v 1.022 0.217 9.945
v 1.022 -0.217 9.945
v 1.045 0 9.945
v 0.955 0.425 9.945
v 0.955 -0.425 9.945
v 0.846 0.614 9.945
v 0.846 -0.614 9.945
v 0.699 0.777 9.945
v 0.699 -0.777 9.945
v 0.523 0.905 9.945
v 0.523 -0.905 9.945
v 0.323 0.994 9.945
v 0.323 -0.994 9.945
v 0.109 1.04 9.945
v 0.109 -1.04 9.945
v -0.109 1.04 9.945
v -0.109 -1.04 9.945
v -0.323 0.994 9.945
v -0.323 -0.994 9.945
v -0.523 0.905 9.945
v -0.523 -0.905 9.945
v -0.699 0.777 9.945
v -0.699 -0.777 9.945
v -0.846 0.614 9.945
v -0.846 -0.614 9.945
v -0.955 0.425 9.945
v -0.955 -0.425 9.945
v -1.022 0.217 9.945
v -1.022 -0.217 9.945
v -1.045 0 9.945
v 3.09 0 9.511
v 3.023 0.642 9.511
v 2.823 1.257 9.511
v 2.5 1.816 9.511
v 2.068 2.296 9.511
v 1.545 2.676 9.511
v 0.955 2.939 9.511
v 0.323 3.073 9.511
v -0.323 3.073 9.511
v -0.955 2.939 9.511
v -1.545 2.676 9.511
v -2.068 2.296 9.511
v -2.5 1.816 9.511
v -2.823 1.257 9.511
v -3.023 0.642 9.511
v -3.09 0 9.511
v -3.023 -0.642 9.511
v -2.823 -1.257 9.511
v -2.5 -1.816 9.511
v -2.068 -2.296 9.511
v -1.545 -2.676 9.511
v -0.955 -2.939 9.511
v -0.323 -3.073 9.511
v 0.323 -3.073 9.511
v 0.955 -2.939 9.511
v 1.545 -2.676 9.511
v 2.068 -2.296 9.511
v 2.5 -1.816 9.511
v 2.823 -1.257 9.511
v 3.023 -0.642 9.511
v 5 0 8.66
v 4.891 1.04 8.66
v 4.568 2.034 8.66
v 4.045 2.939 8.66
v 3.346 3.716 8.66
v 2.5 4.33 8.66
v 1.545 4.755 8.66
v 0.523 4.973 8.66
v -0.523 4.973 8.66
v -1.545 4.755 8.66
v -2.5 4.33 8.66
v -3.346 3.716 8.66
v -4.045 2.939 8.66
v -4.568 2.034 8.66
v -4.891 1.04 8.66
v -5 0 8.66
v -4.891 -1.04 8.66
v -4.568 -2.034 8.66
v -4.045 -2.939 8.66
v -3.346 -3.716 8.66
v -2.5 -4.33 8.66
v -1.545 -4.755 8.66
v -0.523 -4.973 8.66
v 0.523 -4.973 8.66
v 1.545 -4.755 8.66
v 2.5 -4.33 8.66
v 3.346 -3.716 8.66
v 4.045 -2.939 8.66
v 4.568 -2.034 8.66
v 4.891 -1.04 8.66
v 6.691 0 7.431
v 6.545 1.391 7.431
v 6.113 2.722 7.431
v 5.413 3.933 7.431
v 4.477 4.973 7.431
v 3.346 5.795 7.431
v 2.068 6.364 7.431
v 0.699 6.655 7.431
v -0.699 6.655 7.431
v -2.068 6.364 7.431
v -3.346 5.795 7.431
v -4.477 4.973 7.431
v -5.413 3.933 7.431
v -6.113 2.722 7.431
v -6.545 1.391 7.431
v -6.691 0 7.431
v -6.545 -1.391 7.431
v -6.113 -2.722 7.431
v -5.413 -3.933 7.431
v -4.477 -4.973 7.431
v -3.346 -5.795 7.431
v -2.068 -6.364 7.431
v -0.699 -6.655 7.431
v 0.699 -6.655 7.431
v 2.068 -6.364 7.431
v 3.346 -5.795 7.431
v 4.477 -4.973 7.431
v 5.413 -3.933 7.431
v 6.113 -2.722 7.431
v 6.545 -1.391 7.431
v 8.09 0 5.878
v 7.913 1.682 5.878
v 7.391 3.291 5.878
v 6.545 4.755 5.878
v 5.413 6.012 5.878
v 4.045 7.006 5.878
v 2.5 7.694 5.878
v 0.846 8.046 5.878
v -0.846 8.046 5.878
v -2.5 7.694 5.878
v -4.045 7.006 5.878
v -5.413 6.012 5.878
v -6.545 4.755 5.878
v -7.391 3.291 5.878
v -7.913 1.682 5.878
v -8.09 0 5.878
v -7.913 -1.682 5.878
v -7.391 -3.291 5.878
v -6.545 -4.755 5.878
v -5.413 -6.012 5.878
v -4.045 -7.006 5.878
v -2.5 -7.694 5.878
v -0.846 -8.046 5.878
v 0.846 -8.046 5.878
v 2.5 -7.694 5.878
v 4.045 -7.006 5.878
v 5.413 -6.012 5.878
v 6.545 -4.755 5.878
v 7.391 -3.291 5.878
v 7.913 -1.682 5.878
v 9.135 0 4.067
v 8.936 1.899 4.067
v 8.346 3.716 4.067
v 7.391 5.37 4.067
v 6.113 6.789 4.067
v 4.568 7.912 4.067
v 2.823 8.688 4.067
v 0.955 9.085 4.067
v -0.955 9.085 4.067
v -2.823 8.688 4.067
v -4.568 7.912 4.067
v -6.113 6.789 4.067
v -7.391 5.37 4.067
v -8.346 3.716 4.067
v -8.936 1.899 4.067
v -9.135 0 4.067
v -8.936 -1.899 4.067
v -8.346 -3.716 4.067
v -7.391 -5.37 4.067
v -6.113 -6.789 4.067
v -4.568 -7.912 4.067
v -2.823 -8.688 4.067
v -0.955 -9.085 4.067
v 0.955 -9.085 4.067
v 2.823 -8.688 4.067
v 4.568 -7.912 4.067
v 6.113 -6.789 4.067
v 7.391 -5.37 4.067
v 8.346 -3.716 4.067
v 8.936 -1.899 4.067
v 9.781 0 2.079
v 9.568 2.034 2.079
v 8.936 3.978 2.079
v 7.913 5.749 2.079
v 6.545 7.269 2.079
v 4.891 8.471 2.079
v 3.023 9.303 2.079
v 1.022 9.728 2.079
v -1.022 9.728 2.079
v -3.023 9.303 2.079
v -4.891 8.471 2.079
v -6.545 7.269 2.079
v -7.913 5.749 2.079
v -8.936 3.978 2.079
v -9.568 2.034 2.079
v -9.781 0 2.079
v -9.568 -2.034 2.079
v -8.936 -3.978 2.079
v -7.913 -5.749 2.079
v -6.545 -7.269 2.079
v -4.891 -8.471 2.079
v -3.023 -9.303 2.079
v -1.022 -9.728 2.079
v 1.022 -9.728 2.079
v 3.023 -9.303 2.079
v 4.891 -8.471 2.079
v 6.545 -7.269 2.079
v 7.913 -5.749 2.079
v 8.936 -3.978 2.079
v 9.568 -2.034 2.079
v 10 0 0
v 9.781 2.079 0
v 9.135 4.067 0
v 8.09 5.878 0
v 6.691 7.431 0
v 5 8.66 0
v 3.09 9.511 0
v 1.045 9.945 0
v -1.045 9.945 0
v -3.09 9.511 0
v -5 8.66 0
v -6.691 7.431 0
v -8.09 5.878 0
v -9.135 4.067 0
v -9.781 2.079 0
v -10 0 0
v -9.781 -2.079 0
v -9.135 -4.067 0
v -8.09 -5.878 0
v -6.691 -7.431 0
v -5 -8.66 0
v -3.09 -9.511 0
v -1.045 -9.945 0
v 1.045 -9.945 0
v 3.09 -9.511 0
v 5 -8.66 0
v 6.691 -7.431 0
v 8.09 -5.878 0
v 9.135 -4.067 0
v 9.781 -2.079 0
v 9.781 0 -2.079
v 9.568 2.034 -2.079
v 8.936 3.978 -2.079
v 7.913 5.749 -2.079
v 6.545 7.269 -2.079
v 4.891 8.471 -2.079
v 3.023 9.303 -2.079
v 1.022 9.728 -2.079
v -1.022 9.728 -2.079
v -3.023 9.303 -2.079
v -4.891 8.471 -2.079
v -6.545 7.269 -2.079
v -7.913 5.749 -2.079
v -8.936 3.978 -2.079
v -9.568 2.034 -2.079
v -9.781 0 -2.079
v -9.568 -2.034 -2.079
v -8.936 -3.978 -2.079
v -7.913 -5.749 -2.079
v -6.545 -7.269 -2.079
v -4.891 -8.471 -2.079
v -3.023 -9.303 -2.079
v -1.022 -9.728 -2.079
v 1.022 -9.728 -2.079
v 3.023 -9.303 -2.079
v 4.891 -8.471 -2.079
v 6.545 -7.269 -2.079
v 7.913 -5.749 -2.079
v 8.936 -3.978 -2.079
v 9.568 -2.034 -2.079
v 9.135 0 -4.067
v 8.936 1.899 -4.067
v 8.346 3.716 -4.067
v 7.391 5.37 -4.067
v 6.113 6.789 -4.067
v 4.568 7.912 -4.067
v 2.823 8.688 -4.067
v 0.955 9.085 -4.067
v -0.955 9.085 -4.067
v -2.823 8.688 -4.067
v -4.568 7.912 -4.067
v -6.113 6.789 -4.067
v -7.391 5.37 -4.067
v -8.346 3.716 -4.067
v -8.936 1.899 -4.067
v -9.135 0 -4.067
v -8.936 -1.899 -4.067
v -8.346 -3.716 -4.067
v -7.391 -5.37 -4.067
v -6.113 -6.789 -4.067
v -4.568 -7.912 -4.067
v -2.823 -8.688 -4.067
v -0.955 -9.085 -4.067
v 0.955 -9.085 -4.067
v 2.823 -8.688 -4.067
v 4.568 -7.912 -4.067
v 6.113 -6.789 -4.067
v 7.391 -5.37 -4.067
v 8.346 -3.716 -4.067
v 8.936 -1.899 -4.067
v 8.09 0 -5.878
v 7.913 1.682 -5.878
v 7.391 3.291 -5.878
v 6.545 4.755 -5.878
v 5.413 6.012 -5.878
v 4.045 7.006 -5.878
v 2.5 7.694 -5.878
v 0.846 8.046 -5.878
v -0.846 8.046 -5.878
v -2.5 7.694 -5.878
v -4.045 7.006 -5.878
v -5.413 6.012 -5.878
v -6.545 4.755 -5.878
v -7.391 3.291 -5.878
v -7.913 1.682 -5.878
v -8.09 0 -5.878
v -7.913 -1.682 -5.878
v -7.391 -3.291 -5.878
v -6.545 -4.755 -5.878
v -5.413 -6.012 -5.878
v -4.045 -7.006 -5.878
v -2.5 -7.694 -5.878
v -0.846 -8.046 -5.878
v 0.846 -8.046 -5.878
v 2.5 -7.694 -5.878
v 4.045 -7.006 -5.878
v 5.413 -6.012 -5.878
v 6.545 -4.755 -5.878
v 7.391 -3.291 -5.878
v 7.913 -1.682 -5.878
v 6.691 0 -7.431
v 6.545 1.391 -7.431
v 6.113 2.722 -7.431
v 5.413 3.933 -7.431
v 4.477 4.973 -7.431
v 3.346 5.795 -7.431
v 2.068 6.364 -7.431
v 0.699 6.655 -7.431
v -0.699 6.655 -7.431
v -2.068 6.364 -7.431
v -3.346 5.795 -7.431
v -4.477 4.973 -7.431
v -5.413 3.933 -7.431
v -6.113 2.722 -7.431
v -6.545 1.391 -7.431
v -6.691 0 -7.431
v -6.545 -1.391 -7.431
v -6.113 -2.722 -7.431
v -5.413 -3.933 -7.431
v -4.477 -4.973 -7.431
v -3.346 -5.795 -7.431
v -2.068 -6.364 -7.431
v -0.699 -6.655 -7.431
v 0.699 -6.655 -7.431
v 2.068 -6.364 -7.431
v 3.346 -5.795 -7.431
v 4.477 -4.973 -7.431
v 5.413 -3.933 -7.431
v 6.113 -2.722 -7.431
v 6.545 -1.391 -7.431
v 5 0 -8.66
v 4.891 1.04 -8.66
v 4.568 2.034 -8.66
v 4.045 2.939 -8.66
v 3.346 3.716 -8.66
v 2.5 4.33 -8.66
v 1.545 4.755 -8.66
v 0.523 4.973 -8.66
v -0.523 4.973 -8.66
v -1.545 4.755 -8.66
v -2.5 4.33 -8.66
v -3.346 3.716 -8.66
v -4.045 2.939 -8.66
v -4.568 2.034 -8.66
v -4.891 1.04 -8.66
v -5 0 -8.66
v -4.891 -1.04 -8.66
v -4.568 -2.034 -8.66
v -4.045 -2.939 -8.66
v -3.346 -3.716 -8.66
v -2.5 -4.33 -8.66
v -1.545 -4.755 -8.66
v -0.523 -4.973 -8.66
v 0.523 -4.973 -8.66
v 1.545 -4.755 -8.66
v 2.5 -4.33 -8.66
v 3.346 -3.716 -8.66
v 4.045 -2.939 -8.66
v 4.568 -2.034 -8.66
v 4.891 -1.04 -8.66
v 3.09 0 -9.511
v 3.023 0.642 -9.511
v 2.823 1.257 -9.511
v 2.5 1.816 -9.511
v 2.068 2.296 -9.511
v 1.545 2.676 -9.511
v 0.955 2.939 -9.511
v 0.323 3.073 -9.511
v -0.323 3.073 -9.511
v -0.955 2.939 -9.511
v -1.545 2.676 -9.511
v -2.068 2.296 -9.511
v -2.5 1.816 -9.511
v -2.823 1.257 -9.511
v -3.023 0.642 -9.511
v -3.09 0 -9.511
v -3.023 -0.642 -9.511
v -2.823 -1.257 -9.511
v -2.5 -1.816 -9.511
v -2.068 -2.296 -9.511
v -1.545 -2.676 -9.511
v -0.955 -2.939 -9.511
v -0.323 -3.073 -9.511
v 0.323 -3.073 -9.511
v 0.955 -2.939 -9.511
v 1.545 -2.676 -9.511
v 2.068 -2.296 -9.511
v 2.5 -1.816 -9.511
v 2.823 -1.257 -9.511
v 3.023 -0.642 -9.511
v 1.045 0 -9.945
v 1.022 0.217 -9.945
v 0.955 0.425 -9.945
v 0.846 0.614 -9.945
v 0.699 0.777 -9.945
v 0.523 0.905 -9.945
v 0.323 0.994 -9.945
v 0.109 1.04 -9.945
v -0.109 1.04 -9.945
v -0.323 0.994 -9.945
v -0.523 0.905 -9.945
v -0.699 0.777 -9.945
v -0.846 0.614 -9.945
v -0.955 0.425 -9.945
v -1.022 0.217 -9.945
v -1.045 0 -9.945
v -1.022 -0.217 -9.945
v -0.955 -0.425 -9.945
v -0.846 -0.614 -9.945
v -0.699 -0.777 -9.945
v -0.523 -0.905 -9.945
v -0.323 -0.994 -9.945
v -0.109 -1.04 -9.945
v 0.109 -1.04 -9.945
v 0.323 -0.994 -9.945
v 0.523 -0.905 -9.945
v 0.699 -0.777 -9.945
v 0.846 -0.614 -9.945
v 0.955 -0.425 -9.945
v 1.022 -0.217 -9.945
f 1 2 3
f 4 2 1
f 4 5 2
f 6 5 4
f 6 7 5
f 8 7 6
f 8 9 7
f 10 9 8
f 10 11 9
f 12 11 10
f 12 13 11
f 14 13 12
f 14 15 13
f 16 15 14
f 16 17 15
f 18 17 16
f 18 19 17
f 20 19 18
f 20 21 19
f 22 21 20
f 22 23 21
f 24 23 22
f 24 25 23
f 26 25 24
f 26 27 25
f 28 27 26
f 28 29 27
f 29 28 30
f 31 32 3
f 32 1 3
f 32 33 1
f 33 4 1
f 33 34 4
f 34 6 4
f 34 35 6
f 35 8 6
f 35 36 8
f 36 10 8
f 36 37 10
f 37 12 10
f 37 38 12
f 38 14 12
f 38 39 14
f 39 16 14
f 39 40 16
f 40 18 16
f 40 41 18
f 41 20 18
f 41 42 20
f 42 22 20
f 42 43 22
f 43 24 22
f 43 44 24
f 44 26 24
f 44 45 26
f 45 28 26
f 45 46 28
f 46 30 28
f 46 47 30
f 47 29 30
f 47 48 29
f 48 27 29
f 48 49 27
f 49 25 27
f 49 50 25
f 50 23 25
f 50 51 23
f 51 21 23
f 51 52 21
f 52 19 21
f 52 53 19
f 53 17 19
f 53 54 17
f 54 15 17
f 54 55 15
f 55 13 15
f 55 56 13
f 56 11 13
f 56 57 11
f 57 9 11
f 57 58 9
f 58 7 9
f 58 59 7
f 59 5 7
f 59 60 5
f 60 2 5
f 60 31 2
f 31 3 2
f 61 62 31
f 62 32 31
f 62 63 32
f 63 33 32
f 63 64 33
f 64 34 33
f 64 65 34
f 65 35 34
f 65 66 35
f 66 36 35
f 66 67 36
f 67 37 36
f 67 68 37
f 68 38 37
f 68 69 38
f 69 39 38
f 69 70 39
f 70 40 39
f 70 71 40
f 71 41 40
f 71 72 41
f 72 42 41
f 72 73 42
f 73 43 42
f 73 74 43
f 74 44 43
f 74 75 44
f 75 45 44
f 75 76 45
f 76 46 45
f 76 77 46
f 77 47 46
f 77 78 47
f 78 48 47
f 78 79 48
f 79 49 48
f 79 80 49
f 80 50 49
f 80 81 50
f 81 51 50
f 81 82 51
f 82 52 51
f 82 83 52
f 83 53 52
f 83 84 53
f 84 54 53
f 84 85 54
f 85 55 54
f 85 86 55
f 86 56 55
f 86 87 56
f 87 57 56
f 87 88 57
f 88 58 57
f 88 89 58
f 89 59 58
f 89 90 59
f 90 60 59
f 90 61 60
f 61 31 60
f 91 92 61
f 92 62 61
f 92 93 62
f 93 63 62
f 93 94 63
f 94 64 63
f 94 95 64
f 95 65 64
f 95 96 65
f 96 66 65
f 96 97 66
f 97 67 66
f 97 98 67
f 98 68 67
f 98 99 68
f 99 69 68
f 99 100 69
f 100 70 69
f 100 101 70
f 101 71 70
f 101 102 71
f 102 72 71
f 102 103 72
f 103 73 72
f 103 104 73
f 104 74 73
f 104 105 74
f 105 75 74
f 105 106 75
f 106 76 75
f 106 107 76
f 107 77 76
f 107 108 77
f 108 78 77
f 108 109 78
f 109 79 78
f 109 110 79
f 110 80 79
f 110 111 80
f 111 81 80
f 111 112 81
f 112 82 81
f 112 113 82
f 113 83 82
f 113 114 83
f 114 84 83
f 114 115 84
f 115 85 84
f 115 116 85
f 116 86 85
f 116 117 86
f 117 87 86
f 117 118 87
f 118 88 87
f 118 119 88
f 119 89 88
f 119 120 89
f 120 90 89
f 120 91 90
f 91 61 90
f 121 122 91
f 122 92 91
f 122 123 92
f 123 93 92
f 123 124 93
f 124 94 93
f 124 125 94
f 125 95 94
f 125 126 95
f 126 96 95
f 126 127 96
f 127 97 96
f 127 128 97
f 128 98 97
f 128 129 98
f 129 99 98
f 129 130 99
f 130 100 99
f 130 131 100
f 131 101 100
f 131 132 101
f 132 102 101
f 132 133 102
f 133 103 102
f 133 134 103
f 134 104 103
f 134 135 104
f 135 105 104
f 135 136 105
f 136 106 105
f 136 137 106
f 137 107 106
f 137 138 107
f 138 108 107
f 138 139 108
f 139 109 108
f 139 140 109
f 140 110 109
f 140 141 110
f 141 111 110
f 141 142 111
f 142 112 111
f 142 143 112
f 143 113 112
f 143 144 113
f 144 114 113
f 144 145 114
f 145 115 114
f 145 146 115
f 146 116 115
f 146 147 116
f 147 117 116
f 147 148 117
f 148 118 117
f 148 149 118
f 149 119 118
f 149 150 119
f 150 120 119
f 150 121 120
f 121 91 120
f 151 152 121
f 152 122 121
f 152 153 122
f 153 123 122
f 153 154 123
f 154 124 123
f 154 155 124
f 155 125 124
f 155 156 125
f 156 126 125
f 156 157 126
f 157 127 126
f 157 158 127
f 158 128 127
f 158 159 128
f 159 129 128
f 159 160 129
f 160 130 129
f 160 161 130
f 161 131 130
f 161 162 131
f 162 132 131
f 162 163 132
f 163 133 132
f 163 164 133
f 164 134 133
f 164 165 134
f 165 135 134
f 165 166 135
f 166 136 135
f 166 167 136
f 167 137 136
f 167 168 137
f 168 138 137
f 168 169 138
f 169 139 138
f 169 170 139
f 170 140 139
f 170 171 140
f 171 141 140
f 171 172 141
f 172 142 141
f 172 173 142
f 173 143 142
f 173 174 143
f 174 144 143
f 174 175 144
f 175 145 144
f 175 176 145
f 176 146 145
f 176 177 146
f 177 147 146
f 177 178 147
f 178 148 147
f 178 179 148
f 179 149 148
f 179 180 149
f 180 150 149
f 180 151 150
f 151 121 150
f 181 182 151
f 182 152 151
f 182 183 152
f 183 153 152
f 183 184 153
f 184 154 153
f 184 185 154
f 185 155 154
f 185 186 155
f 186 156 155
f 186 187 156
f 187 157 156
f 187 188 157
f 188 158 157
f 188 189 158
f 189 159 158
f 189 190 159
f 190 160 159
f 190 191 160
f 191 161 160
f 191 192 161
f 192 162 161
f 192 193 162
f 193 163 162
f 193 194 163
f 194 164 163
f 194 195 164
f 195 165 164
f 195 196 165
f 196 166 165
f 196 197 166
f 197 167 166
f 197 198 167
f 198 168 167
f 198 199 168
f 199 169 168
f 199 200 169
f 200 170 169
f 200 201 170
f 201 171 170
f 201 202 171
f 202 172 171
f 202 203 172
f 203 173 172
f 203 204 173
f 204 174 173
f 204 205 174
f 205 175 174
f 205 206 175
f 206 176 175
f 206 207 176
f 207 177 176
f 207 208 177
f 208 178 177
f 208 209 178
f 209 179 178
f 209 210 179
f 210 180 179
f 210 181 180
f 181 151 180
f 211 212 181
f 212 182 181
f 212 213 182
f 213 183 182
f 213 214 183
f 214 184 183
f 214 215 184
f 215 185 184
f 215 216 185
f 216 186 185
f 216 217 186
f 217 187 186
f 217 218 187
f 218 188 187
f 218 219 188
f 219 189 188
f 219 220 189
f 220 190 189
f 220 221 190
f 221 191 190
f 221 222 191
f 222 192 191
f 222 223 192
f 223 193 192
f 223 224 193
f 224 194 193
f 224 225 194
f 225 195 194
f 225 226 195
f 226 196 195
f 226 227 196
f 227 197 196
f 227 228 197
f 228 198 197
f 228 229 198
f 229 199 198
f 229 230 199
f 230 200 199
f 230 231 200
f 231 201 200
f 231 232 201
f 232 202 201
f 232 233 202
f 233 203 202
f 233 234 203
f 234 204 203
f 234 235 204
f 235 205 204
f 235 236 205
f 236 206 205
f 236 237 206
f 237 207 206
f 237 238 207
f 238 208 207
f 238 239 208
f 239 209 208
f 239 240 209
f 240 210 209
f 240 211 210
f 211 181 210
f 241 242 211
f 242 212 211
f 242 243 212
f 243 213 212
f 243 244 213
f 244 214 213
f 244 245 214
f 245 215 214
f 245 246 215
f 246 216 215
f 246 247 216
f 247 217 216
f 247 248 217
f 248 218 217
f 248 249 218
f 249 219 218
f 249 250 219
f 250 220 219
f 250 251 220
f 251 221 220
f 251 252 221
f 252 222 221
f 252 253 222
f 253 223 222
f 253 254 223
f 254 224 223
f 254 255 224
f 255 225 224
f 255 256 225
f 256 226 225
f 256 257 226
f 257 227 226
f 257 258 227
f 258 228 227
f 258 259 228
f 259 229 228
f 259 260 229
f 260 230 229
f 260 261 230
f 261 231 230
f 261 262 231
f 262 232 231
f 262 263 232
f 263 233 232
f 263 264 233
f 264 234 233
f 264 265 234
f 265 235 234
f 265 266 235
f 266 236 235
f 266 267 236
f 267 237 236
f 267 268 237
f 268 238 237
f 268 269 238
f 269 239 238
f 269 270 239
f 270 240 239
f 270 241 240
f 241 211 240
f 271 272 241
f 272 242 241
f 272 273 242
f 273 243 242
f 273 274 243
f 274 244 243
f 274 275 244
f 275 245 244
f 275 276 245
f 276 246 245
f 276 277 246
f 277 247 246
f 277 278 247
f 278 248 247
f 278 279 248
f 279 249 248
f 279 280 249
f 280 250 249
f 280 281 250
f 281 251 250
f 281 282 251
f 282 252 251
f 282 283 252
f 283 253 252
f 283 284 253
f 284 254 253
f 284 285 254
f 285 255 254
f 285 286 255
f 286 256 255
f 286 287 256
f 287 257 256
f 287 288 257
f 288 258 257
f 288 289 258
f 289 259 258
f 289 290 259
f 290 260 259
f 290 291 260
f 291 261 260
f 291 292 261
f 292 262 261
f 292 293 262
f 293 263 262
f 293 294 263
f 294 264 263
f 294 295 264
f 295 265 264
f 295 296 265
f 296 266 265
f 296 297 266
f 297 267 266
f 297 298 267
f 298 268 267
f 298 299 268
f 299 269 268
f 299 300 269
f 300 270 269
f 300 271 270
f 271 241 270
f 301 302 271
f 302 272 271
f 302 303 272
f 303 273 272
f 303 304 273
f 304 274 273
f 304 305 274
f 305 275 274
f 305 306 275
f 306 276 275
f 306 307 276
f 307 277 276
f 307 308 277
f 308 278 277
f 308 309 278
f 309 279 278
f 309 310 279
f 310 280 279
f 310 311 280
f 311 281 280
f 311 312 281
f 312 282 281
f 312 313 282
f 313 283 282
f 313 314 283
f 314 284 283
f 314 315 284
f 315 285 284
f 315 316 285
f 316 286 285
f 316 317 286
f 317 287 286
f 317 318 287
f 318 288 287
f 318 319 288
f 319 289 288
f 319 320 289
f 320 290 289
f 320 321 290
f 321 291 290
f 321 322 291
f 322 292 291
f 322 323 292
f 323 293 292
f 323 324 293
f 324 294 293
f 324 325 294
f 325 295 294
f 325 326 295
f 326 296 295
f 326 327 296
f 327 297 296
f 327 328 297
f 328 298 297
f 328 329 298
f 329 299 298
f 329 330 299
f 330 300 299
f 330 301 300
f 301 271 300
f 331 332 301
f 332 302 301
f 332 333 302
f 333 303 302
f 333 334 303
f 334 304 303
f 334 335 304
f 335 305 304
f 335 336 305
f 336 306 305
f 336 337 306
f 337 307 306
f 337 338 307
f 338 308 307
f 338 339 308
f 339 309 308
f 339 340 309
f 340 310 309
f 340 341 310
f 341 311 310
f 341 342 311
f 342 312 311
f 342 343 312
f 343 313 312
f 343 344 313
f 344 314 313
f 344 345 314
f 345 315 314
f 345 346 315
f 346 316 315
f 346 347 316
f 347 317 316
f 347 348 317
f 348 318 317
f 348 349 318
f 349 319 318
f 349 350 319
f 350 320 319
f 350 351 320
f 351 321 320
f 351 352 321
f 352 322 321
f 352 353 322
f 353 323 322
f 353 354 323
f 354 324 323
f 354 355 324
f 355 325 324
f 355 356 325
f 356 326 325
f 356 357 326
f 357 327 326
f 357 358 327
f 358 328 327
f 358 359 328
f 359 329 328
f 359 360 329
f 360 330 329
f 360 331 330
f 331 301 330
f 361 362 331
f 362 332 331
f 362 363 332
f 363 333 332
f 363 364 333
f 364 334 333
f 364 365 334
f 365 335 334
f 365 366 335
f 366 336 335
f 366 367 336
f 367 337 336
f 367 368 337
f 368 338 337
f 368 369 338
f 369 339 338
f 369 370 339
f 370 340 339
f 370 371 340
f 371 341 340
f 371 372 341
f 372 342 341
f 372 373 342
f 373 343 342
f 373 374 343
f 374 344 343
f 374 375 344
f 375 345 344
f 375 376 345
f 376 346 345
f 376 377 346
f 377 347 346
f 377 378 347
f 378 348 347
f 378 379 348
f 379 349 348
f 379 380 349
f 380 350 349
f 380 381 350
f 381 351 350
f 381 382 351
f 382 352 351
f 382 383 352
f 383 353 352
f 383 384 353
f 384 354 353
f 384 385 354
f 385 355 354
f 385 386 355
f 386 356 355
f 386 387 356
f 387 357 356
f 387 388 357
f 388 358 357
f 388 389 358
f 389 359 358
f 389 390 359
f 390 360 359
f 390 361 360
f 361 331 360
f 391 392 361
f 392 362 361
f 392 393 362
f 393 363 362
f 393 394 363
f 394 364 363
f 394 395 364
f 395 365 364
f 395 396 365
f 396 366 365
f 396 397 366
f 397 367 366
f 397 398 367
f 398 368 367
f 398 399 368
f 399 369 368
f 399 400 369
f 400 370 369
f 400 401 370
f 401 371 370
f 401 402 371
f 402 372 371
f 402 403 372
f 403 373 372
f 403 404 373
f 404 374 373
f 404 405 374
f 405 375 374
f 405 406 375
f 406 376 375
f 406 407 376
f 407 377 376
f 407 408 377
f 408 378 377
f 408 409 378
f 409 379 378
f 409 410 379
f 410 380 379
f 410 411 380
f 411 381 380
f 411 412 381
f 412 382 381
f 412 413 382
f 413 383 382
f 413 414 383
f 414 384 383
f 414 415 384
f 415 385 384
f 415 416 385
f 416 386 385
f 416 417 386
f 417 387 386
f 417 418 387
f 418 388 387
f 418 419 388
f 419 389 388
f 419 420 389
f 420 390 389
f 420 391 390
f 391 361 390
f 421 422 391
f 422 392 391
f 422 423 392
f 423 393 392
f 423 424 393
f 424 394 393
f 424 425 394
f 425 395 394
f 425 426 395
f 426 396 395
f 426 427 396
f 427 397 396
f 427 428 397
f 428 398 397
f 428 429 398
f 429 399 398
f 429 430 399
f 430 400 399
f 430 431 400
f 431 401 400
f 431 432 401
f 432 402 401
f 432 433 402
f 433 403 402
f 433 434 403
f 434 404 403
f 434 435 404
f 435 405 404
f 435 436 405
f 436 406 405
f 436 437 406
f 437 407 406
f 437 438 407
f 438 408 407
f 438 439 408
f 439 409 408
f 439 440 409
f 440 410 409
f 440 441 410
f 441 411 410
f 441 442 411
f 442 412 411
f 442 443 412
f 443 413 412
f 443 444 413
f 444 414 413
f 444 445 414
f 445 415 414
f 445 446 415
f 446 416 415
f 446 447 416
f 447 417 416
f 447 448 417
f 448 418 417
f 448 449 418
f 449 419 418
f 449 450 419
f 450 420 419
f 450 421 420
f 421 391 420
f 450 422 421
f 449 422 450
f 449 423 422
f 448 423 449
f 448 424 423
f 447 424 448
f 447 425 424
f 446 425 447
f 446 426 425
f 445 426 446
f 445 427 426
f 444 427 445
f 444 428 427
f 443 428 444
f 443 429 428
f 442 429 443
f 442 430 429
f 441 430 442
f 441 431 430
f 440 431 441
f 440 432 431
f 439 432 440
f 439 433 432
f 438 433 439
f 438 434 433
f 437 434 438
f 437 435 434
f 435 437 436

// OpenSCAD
// Unit of length: Unit.MM
color(c = [1.0, 0.0, 1.0, 1.0])
{
   sphere(d = 20.0);
}
